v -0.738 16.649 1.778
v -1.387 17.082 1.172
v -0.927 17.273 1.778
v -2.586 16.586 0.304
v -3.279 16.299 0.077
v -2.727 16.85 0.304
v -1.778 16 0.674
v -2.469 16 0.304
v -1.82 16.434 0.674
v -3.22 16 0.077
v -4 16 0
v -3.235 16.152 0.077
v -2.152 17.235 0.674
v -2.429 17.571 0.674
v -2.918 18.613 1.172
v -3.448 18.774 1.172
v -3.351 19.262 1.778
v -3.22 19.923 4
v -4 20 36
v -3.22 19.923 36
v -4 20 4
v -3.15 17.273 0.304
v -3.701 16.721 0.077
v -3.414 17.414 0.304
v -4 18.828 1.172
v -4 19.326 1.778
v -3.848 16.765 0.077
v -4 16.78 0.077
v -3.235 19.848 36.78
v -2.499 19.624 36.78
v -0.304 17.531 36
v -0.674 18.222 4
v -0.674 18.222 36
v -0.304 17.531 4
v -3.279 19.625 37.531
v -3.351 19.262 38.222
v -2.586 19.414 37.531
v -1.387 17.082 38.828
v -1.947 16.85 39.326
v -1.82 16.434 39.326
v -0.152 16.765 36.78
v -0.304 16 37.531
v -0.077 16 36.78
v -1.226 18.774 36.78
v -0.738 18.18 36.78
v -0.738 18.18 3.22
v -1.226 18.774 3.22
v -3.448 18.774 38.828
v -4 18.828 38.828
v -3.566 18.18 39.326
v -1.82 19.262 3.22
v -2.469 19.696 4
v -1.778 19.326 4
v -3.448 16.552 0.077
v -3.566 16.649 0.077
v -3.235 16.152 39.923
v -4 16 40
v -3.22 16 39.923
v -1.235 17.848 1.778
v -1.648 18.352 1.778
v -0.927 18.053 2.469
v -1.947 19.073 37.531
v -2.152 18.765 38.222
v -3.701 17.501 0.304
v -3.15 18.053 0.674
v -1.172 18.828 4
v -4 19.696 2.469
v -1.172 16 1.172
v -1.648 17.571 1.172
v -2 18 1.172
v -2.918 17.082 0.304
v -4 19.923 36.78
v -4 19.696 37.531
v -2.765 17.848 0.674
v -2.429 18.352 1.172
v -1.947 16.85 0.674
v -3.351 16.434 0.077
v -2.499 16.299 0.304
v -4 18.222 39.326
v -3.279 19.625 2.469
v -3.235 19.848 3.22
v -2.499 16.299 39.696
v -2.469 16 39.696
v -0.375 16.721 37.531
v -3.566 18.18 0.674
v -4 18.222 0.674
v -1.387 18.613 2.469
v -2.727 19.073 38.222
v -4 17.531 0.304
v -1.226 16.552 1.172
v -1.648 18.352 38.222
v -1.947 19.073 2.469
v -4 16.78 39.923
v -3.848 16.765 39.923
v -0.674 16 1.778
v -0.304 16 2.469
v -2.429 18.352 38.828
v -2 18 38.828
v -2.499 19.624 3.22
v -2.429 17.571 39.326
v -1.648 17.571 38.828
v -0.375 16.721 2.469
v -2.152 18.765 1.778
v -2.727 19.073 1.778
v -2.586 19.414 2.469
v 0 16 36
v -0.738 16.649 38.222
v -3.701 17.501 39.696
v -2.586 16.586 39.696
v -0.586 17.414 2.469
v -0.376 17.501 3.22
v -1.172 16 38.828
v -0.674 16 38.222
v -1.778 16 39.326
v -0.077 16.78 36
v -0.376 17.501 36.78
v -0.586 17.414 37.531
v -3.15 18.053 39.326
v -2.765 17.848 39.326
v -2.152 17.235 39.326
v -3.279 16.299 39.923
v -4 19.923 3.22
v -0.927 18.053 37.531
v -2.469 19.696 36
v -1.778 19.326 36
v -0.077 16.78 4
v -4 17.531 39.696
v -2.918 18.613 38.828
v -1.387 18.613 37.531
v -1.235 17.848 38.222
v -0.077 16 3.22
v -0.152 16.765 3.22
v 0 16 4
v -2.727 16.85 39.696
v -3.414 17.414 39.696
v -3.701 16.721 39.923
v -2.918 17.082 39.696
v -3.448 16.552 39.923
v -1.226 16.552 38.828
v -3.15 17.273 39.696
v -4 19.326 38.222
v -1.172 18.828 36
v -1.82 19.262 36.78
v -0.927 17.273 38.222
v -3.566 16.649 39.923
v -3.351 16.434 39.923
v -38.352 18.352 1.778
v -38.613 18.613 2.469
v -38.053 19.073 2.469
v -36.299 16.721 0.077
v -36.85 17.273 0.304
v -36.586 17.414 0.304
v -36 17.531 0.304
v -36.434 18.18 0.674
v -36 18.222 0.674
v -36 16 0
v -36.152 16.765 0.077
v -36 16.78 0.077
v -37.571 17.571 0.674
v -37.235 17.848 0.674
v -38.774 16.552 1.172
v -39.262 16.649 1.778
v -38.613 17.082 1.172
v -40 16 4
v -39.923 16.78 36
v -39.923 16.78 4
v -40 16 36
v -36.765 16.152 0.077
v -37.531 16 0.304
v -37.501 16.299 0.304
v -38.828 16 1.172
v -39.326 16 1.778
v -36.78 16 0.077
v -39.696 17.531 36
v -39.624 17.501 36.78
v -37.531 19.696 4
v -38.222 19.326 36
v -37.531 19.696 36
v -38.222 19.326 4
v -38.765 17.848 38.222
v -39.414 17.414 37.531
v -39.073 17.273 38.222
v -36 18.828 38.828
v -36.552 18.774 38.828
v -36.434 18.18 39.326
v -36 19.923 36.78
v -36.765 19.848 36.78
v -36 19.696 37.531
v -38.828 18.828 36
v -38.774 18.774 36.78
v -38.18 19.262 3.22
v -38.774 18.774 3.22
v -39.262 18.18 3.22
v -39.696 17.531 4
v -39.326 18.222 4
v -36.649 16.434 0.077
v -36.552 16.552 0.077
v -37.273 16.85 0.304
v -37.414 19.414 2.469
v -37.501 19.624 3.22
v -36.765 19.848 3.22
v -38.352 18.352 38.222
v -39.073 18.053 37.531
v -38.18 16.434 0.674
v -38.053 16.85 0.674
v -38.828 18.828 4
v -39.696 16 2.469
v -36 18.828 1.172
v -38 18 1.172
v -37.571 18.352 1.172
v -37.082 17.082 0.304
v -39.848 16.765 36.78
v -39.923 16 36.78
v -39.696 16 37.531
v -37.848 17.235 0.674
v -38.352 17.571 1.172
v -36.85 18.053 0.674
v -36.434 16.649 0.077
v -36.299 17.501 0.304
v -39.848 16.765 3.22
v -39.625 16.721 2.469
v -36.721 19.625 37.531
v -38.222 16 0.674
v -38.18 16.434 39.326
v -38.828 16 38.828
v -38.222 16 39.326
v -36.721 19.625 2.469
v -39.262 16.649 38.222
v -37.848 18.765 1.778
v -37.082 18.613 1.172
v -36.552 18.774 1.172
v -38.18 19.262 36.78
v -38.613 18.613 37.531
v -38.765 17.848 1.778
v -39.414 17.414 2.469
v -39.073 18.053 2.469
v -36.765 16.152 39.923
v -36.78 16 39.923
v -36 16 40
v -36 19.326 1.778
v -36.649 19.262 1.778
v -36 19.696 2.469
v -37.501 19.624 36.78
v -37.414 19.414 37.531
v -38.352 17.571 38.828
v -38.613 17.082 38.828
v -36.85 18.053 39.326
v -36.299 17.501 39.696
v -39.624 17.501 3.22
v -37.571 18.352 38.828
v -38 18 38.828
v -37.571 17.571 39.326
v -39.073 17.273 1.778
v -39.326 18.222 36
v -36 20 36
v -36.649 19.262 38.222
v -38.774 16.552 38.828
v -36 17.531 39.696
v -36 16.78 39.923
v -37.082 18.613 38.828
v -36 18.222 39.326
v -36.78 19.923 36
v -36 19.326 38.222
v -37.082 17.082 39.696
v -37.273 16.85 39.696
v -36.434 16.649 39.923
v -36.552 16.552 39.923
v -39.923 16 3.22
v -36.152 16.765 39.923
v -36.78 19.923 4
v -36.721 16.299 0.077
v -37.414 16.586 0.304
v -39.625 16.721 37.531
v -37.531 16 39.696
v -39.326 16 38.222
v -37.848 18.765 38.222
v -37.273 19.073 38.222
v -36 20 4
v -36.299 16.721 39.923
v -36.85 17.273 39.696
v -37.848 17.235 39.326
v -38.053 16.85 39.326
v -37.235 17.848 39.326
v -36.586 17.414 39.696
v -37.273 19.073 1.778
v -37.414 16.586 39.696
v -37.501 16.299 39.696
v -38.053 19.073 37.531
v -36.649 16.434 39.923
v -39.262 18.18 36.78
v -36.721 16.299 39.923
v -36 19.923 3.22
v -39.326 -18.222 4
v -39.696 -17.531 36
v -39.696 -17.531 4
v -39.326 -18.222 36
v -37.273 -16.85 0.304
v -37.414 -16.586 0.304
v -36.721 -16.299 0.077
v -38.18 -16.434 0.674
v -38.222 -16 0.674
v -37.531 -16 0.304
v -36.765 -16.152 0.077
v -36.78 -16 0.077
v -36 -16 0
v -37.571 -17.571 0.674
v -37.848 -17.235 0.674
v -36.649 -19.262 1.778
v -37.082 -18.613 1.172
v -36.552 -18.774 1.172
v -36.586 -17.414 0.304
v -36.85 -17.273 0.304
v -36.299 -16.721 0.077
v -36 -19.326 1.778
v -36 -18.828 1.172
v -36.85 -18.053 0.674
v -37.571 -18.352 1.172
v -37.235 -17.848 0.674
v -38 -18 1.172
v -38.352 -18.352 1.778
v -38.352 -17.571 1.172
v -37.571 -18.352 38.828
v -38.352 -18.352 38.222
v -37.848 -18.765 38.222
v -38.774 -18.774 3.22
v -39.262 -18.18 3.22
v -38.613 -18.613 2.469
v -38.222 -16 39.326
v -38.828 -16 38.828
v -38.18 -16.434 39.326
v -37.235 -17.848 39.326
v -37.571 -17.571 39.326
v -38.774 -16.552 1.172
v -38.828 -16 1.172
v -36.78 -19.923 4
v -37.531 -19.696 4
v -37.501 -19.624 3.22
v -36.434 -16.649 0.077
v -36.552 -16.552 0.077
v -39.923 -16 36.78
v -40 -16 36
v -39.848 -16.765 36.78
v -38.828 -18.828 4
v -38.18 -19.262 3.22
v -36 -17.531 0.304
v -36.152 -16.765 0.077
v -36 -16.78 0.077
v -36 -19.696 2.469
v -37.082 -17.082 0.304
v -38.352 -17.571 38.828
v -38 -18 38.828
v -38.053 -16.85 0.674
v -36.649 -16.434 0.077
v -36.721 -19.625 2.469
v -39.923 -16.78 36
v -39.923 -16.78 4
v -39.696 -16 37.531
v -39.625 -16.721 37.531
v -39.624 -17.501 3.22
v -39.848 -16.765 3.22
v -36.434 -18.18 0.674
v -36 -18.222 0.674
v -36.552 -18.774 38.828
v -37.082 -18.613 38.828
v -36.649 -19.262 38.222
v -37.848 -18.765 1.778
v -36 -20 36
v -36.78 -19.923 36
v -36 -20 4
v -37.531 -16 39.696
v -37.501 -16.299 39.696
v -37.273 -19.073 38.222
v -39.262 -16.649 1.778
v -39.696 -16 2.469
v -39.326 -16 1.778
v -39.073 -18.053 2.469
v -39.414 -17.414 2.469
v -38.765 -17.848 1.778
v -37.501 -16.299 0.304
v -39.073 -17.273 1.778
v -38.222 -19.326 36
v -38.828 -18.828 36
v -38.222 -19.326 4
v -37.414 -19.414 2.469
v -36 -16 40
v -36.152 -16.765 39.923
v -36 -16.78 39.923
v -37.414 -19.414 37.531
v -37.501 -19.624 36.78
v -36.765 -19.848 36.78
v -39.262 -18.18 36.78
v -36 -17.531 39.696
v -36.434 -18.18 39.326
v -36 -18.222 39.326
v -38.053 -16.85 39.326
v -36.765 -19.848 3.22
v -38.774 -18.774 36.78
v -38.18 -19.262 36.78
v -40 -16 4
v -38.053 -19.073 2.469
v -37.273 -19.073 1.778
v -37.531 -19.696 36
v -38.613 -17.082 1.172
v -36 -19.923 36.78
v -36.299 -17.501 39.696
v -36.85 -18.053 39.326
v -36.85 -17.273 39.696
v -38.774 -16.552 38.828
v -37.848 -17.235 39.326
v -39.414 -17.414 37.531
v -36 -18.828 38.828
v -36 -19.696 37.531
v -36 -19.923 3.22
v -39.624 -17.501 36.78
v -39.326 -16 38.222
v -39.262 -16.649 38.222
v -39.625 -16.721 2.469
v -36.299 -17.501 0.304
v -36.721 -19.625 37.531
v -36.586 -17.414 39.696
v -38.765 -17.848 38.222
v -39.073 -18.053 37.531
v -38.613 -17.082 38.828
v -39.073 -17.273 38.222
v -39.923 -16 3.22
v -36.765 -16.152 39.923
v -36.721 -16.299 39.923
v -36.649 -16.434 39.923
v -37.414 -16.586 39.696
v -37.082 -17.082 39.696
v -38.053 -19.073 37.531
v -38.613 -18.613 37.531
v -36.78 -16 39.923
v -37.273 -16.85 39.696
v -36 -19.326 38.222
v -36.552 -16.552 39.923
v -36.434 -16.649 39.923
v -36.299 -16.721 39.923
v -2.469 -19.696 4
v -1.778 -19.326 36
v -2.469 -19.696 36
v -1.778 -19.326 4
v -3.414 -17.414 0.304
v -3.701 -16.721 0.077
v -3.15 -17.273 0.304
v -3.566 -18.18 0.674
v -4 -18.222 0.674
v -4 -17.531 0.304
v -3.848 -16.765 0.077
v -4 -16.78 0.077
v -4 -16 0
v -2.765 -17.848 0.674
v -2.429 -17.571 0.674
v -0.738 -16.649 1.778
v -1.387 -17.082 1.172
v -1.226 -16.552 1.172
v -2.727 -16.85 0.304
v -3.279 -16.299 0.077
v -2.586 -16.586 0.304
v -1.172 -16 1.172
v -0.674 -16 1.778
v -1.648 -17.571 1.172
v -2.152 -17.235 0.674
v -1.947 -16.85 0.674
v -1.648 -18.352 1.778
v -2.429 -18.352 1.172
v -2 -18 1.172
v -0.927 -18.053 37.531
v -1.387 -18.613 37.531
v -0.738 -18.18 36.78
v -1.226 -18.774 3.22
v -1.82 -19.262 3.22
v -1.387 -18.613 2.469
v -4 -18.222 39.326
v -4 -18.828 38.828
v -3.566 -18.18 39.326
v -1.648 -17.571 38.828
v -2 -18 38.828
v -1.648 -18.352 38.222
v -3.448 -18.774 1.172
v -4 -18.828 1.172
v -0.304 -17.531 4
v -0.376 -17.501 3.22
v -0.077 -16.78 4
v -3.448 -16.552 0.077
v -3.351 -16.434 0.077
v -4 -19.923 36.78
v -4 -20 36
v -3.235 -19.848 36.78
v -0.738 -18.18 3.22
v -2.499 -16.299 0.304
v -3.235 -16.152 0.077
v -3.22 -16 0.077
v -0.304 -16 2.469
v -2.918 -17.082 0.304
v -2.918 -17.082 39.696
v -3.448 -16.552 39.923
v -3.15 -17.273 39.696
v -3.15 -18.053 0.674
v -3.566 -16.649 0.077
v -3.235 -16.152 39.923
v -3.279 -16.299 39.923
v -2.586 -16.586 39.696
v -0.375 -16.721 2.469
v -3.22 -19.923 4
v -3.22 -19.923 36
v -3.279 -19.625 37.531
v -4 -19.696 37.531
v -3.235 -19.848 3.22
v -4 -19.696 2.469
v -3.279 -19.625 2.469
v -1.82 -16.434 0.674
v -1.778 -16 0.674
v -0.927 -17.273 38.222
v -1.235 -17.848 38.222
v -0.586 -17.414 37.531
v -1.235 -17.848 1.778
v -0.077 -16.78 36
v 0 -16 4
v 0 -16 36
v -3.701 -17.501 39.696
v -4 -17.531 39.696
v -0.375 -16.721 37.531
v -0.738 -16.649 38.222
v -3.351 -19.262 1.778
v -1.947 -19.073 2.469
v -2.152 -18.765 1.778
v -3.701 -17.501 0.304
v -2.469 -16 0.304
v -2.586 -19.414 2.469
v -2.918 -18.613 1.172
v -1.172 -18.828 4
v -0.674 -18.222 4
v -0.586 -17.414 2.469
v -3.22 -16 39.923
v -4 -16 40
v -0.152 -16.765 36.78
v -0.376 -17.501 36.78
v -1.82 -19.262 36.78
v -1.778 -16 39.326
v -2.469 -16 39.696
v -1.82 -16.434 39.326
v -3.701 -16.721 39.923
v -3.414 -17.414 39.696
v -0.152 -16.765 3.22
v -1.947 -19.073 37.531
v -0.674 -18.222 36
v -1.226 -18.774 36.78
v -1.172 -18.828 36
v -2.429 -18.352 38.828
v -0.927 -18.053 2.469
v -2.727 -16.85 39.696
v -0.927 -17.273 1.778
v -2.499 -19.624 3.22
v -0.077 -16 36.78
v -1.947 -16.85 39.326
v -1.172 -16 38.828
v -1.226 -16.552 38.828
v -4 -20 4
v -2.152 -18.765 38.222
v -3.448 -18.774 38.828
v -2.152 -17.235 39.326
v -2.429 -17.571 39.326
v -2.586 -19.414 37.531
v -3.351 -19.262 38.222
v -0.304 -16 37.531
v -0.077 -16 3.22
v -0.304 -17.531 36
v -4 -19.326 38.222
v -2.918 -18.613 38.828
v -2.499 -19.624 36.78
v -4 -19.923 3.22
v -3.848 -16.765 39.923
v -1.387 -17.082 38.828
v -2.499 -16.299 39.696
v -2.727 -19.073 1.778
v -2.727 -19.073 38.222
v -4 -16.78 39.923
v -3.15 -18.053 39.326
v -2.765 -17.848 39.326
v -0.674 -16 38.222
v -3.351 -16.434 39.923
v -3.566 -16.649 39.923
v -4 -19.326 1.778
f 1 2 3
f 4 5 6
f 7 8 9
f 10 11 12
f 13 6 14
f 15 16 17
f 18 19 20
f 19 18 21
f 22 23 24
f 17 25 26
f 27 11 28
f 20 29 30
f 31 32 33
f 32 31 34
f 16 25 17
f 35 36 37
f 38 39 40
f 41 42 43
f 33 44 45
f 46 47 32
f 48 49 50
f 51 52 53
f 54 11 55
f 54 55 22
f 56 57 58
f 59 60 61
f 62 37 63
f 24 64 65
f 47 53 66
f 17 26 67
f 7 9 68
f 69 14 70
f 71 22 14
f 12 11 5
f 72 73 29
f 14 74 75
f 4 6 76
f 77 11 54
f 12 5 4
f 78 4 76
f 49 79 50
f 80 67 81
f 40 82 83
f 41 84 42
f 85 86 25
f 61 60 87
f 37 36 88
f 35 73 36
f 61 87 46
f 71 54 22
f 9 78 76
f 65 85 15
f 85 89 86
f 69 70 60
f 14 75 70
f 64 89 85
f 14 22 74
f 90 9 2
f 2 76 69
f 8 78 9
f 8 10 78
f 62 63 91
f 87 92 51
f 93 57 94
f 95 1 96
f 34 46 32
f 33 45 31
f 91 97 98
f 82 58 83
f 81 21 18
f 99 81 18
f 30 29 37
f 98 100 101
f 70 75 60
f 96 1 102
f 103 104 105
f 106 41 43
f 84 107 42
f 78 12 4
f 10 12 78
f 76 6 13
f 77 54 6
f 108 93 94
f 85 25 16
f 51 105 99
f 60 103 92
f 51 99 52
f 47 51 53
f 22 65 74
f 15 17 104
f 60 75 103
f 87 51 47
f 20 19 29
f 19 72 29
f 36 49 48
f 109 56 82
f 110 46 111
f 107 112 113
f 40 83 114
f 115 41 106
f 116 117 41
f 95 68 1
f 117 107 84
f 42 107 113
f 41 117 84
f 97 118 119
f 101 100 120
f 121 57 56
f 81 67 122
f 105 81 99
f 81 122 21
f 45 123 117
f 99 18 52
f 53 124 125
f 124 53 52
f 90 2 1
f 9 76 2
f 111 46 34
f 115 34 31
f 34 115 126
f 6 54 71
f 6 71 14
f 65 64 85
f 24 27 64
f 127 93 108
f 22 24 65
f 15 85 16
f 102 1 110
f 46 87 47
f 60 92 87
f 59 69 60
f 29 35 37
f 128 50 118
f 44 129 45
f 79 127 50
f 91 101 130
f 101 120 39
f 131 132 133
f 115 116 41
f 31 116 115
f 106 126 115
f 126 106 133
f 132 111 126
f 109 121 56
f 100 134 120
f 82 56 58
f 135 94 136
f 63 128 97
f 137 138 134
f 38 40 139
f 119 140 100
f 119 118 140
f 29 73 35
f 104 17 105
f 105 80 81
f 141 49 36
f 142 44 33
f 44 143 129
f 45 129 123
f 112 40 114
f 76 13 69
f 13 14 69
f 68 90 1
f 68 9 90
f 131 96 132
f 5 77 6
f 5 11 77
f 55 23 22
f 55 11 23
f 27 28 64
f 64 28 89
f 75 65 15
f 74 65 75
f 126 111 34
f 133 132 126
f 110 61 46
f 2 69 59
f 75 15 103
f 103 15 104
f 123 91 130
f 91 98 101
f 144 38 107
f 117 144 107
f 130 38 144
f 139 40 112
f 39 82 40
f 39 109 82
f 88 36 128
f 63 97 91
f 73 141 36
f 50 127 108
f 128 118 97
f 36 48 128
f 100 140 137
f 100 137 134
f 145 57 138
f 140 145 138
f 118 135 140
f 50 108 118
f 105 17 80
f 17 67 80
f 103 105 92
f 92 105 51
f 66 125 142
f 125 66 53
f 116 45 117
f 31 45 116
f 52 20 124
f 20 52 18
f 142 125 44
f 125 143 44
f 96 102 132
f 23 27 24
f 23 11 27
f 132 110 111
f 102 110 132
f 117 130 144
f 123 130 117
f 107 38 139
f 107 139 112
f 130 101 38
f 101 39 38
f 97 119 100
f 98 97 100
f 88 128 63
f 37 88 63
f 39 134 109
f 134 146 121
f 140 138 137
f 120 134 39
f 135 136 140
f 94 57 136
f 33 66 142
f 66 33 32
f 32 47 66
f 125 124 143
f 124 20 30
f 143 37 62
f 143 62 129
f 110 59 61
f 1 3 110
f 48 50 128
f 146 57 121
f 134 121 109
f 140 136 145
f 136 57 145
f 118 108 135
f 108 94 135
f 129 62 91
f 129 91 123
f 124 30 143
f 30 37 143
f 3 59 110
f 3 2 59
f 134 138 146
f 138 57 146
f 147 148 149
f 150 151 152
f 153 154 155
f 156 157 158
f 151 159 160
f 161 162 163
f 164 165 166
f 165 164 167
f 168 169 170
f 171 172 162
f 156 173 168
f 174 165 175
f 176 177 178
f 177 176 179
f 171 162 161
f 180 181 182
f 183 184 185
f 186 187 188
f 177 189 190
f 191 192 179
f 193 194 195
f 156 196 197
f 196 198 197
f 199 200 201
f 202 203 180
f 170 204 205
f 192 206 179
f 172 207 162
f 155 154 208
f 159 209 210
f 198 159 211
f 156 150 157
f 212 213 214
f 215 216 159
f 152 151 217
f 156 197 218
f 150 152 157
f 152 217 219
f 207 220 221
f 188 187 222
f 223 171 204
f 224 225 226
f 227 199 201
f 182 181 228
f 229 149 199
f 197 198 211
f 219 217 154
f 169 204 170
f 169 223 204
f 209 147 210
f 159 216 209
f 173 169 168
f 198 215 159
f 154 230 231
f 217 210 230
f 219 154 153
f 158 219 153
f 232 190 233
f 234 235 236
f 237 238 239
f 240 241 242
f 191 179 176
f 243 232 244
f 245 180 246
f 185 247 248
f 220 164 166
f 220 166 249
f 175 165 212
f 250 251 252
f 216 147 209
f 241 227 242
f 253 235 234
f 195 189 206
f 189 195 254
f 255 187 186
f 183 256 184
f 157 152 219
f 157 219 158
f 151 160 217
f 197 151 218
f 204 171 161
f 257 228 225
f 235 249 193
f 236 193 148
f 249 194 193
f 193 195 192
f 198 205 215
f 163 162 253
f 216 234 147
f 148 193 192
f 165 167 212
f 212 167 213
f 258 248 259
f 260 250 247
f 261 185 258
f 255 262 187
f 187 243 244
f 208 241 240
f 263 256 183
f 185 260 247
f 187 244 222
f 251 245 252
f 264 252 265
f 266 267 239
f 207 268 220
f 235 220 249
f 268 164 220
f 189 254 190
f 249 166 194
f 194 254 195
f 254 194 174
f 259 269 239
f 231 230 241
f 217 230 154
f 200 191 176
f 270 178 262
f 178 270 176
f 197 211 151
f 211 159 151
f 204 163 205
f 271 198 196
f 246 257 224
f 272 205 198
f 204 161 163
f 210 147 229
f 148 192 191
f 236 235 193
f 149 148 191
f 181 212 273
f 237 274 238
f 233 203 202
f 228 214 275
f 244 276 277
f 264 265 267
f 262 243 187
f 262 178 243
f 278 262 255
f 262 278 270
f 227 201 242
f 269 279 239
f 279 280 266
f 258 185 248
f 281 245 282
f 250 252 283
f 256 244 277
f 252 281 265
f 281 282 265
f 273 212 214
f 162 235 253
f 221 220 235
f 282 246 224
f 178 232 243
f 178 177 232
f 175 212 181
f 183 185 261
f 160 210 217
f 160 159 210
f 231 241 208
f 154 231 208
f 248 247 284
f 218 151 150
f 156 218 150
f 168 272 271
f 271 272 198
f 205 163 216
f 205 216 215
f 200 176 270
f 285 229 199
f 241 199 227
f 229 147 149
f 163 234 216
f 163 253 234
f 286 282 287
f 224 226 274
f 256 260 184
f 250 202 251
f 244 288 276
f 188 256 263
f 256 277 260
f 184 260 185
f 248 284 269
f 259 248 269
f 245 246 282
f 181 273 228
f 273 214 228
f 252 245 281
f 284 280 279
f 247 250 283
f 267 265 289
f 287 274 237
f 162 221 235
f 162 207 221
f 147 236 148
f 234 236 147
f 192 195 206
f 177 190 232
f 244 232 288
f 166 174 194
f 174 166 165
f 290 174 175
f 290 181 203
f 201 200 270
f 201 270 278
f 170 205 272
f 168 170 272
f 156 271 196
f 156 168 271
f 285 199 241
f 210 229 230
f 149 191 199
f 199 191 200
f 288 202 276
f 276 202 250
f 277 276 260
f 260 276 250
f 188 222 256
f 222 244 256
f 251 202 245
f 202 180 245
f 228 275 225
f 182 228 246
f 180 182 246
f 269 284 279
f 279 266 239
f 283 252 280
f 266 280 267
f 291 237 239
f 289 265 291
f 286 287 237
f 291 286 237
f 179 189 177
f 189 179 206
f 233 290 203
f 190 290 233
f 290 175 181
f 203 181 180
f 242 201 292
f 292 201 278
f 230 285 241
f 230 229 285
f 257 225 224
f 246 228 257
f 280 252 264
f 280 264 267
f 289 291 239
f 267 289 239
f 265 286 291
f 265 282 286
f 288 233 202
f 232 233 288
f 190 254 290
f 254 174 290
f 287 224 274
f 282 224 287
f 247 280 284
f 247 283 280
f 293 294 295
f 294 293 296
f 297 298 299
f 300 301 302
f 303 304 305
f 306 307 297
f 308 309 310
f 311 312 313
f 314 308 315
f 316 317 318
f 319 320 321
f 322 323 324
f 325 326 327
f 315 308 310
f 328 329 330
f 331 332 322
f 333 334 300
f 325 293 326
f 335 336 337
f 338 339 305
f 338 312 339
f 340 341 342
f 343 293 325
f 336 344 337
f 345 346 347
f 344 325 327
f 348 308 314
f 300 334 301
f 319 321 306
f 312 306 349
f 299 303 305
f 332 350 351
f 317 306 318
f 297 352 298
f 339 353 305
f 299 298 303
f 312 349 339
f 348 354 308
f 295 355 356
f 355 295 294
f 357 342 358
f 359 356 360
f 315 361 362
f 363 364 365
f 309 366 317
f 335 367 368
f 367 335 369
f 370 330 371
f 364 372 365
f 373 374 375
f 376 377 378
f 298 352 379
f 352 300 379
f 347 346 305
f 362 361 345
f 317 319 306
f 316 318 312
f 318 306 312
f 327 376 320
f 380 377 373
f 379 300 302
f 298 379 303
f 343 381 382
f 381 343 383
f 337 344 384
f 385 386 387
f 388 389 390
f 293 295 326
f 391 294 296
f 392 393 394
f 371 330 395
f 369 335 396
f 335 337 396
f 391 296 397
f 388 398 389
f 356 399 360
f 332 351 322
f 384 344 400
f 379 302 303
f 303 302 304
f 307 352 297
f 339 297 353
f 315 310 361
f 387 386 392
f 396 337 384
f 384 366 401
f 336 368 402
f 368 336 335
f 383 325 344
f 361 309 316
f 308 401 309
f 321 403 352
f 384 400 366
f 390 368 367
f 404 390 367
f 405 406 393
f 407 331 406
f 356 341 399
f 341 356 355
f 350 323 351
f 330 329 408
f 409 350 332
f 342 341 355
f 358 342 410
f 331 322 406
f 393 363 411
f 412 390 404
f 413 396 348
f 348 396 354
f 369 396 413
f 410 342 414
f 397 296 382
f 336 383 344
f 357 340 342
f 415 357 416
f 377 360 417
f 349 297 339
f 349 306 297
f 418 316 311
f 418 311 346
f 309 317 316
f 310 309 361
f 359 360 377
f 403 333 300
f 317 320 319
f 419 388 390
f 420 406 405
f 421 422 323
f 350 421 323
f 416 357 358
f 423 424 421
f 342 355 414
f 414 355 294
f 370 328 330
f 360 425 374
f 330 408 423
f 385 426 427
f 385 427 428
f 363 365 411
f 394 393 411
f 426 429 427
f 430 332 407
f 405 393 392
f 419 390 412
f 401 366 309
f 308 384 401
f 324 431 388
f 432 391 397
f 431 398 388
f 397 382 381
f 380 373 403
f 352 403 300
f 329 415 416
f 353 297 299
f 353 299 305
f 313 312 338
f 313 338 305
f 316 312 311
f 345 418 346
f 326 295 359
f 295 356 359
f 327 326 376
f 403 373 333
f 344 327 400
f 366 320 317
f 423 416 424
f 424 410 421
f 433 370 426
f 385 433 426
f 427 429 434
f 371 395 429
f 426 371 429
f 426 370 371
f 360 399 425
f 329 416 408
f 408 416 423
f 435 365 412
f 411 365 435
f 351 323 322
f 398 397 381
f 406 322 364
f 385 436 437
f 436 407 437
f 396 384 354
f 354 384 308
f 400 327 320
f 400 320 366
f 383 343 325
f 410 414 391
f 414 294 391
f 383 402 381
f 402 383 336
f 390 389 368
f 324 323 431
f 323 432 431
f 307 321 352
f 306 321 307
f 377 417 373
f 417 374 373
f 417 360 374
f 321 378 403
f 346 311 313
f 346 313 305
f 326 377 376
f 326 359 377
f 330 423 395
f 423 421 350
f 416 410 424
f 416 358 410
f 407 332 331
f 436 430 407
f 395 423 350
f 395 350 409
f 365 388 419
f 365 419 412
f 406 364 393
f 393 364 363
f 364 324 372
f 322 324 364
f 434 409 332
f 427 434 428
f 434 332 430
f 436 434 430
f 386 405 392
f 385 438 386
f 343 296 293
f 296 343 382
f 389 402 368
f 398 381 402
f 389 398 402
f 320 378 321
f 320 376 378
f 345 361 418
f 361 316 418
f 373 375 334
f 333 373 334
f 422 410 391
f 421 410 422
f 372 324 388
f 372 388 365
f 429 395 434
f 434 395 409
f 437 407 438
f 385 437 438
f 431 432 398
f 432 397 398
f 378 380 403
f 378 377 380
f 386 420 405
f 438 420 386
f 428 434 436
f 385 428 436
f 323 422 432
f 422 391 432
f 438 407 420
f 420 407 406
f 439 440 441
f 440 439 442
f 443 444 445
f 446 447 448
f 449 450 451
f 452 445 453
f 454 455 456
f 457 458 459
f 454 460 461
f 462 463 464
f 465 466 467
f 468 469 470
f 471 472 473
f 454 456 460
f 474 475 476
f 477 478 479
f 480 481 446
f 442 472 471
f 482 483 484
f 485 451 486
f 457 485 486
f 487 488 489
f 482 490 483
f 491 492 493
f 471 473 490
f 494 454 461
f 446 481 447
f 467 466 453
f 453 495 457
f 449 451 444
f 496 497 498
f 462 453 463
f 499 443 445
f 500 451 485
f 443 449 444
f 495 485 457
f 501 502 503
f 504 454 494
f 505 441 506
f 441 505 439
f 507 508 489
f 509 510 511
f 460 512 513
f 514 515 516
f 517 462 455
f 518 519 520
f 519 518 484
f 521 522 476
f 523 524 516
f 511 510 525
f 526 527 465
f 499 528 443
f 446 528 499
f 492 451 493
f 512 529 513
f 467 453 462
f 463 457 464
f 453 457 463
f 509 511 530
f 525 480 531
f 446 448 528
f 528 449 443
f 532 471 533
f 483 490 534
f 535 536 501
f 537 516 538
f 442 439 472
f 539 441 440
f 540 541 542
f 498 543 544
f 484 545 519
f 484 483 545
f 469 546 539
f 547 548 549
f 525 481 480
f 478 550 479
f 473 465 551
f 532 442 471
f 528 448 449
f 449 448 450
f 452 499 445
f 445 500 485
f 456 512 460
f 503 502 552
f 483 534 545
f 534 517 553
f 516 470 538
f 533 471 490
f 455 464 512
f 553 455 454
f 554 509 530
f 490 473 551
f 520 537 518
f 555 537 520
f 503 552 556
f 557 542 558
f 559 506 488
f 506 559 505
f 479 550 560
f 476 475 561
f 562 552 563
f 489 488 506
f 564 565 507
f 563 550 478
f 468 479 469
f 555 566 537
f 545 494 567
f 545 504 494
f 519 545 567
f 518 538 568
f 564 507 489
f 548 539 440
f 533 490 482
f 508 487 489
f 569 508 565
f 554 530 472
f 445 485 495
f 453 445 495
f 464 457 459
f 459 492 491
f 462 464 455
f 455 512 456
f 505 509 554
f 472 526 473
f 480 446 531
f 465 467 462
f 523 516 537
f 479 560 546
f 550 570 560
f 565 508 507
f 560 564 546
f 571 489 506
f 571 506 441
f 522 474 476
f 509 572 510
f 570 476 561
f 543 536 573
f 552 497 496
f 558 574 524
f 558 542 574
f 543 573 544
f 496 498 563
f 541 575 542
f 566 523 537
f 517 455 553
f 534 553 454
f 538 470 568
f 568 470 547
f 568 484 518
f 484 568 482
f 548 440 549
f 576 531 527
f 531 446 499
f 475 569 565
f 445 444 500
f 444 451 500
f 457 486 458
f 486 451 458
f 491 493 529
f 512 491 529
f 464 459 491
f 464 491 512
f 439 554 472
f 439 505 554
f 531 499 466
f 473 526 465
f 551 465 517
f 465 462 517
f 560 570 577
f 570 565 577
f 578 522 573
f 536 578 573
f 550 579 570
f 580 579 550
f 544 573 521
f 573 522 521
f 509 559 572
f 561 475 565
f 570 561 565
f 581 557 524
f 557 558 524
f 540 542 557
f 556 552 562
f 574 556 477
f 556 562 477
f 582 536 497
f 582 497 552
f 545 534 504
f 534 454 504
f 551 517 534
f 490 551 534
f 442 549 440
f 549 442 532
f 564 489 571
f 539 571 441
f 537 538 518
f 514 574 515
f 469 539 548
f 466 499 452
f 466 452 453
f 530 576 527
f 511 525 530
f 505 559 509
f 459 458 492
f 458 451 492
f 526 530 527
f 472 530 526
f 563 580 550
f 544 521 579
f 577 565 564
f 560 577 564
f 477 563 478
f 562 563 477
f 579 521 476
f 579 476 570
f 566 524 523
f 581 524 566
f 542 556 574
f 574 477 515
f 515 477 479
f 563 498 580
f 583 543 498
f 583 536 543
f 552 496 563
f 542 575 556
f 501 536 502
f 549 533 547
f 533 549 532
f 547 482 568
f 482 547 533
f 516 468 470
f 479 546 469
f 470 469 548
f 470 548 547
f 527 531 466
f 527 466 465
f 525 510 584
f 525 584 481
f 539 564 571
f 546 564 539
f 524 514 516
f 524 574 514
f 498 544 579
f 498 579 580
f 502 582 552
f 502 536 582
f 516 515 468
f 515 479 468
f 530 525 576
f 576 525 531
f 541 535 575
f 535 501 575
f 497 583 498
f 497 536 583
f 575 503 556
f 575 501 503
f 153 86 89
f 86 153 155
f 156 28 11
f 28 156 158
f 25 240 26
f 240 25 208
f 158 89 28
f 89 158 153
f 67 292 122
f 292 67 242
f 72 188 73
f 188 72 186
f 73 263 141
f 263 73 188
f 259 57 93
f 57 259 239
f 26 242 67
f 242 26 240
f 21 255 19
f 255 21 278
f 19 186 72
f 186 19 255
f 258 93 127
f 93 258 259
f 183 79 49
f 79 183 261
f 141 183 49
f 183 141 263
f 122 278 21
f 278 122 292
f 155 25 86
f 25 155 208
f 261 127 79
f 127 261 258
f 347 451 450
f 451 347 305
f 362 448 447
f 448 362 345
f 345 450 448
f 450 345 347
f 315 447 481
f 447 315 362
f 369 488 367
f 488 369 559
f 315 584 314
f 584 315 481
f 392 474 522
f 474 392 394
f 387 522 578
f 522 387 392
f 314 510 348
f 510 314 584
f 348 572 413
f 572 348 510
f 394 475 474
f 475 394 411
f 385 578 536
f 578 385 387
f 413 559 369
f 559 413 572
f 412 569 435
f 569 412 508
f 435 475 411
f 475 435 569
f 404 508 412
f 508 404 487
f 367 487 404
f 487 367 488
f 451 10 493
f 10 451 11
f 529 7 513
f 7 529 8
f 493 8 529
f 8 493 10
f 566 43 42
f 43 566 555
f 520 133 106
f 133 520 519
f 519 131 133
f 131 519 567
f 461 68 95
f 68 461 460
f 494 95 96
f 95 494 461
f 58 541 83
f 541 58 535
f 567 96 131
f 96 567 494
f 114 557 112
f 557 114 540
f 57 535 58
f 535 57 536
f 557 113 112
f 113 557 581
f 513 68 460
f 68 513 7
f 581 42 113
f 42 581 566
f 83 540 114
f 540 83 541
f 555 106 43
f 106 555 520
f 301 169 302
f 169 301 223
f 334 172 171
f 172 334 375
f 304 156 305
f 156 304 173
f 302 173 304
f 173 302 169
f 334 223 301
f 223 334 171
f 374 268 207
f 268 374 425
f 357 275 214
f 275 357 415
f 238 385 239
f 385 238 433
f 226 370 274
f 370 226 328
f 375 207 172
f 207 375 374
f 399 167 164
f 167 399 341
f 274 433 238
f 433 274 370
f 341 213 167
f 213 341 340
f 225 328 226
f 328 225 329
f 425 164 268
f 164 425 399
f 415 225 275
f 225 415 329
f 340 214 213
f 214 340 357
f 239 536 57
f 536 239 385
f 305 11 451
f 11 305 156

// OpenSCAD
x=40;
y=40;
z=40;
r=4;
center=[-1,0,1];  //[x_axis, y_axis, z_axis] 0=center, 1=posative_side -1=negative_side
$fn=30;


//exanmple:
//squre_round(x,y,r,center);

//exanmple:
cube_round(x,y,z,r,center);


module cube_round(x,y,z,r,center){//width, height, radius
r_max   = x<=y ? (x<=z ? x/2 : z/2) : y/2;     //maximum possinle size of radeus
r_con   = r>0 && r<=r_max ? r :    //radius constrained
              r>r_max ? r_max : 0;

di       = r_con*2;               //diamitor of corner spheres 

echo(str(" Edge Radius .......................... = ", r_con));
echo(str(" Maximum Possible Edge Radius = ", r_max));

//rounds the number of fragments to a multiple of 4 so a vertex will always be at the top, bottom, right and left corners. This prevents slight misalignments of edges and inaccurat dimensions.

sm = $fn<4 ? 20 :  round($fn);
smooth=   sm   %4==0 ? sm   : 
         (sm+1)%4==0 ? sm+1 :
         (sm+2)%4==0 ? sm+2 : sm+3;


color([1,.5,.1])
translate([(center[0]==1 ? 0 : center[0]==-1 ? -x : -x/2) ,
           (center[1]==1 ? 0 : center[1]==-1 ? -y : -y/2) ,
           (center[2]==1 ? 0 : center[2]==-1 ? -z : -z/2)])

if(r<=0 || r==undef){       // without round corners
cube([x,y,z]);
}
else{                       // with round corners
//corners
corner(rot=  0, move=[x-r_con, y-r_con, 0]);//top r
corner(rot= 90, move=[  r_con, y-r_con, 0]);//top l
corner(rot=180, move=[  r_con,   r_con, 0]);//bottom l
corner(rot=-90, move=[x-r_con,   r_con, 0]);//bottom r

//edges
side(lenth=x-di, rot= 90, move=[  r_con, y-r_con, 0]);//top x
side(lenth=x-di, rot=-90, move=[x-r_con,   r_con, 0]);//bottom x
side(lenth=y-di, rot=  0, move=[x-r_con, y-r_con, 0]);//bottom y
side(lenth=y-di, rot=180, move=[  r_con,   r_con, 0]);//bottom y

//inside
translate([r_con, r_con, 0])
cube([x-di, y-di, z]);
}


module corner(rot,move){
translate(move)
rotate([0,0,rot])
rotate_extrude(angle=90, $fn=smooth)
edge_round();
}

module side(lenth,rot,move){
translate(move)
rotate([90,0,rot])
linear_extrude(lenth)
edge_round();
}

module edge_round(){
intersection(){
    square([r_con,z]);  
        hull(){
            translate([0,r_con,0]){
            translate([0,z-di,0])circle(r_con, $fn=smooth);//top  
            rotate([0,0,90])
            circle(r_con, $fn=smooth);//bottom  
            }
        }
    }
}
}



//****************************
module squre_round(x,y,r,center){//width, height, radius
r_max   = x<=y ? x/2 : h/2;     //maximum possinle size of radeus
r_con   = r>0 && r<=r_max ? r :    //radius constrained
          r>r_max ? r_max : 0;
di       = r_con*2;
//rounds the number of fragments to a multiple of 4 so a vertex will always be at the top, bottom, right and left corners. This prevents slight misalignments of edges and inaccurat dimensions.
sm = $fn<4 ? 20 :  round($fn);
smooth=  sm   %4==0 ? sm   : 
        (sm+1)%4==0 ? sm+1 :
        (sm+2)%4==0 ? sm+2 : sm+3;

color([1,.5,.1])
translate([(center[0]==1 ? 0 : center[0]==-1 ? -x : -x/2) ,
           (center[1]==1 ? 0 : center[1]==-1 ? -y : -y/2)])

if(r<=0 || r==undef){       // without round corners
square([x,y]);
}
else
translate([r_con,r_con,0])  // with round corners
hull(){
    translate([x-di, y-di, 0])circle(r_con, $fn=smooth);//top right 
    translate([0   , y-di, 0])circle(r_con, $fn=smooth);//top left 
    translate([x-di, 0   , 0])circle(r_con, $fn=smooth);//bottom right 
                              circle(r_con, $fn=smooth);//bottom left 
    }
}
